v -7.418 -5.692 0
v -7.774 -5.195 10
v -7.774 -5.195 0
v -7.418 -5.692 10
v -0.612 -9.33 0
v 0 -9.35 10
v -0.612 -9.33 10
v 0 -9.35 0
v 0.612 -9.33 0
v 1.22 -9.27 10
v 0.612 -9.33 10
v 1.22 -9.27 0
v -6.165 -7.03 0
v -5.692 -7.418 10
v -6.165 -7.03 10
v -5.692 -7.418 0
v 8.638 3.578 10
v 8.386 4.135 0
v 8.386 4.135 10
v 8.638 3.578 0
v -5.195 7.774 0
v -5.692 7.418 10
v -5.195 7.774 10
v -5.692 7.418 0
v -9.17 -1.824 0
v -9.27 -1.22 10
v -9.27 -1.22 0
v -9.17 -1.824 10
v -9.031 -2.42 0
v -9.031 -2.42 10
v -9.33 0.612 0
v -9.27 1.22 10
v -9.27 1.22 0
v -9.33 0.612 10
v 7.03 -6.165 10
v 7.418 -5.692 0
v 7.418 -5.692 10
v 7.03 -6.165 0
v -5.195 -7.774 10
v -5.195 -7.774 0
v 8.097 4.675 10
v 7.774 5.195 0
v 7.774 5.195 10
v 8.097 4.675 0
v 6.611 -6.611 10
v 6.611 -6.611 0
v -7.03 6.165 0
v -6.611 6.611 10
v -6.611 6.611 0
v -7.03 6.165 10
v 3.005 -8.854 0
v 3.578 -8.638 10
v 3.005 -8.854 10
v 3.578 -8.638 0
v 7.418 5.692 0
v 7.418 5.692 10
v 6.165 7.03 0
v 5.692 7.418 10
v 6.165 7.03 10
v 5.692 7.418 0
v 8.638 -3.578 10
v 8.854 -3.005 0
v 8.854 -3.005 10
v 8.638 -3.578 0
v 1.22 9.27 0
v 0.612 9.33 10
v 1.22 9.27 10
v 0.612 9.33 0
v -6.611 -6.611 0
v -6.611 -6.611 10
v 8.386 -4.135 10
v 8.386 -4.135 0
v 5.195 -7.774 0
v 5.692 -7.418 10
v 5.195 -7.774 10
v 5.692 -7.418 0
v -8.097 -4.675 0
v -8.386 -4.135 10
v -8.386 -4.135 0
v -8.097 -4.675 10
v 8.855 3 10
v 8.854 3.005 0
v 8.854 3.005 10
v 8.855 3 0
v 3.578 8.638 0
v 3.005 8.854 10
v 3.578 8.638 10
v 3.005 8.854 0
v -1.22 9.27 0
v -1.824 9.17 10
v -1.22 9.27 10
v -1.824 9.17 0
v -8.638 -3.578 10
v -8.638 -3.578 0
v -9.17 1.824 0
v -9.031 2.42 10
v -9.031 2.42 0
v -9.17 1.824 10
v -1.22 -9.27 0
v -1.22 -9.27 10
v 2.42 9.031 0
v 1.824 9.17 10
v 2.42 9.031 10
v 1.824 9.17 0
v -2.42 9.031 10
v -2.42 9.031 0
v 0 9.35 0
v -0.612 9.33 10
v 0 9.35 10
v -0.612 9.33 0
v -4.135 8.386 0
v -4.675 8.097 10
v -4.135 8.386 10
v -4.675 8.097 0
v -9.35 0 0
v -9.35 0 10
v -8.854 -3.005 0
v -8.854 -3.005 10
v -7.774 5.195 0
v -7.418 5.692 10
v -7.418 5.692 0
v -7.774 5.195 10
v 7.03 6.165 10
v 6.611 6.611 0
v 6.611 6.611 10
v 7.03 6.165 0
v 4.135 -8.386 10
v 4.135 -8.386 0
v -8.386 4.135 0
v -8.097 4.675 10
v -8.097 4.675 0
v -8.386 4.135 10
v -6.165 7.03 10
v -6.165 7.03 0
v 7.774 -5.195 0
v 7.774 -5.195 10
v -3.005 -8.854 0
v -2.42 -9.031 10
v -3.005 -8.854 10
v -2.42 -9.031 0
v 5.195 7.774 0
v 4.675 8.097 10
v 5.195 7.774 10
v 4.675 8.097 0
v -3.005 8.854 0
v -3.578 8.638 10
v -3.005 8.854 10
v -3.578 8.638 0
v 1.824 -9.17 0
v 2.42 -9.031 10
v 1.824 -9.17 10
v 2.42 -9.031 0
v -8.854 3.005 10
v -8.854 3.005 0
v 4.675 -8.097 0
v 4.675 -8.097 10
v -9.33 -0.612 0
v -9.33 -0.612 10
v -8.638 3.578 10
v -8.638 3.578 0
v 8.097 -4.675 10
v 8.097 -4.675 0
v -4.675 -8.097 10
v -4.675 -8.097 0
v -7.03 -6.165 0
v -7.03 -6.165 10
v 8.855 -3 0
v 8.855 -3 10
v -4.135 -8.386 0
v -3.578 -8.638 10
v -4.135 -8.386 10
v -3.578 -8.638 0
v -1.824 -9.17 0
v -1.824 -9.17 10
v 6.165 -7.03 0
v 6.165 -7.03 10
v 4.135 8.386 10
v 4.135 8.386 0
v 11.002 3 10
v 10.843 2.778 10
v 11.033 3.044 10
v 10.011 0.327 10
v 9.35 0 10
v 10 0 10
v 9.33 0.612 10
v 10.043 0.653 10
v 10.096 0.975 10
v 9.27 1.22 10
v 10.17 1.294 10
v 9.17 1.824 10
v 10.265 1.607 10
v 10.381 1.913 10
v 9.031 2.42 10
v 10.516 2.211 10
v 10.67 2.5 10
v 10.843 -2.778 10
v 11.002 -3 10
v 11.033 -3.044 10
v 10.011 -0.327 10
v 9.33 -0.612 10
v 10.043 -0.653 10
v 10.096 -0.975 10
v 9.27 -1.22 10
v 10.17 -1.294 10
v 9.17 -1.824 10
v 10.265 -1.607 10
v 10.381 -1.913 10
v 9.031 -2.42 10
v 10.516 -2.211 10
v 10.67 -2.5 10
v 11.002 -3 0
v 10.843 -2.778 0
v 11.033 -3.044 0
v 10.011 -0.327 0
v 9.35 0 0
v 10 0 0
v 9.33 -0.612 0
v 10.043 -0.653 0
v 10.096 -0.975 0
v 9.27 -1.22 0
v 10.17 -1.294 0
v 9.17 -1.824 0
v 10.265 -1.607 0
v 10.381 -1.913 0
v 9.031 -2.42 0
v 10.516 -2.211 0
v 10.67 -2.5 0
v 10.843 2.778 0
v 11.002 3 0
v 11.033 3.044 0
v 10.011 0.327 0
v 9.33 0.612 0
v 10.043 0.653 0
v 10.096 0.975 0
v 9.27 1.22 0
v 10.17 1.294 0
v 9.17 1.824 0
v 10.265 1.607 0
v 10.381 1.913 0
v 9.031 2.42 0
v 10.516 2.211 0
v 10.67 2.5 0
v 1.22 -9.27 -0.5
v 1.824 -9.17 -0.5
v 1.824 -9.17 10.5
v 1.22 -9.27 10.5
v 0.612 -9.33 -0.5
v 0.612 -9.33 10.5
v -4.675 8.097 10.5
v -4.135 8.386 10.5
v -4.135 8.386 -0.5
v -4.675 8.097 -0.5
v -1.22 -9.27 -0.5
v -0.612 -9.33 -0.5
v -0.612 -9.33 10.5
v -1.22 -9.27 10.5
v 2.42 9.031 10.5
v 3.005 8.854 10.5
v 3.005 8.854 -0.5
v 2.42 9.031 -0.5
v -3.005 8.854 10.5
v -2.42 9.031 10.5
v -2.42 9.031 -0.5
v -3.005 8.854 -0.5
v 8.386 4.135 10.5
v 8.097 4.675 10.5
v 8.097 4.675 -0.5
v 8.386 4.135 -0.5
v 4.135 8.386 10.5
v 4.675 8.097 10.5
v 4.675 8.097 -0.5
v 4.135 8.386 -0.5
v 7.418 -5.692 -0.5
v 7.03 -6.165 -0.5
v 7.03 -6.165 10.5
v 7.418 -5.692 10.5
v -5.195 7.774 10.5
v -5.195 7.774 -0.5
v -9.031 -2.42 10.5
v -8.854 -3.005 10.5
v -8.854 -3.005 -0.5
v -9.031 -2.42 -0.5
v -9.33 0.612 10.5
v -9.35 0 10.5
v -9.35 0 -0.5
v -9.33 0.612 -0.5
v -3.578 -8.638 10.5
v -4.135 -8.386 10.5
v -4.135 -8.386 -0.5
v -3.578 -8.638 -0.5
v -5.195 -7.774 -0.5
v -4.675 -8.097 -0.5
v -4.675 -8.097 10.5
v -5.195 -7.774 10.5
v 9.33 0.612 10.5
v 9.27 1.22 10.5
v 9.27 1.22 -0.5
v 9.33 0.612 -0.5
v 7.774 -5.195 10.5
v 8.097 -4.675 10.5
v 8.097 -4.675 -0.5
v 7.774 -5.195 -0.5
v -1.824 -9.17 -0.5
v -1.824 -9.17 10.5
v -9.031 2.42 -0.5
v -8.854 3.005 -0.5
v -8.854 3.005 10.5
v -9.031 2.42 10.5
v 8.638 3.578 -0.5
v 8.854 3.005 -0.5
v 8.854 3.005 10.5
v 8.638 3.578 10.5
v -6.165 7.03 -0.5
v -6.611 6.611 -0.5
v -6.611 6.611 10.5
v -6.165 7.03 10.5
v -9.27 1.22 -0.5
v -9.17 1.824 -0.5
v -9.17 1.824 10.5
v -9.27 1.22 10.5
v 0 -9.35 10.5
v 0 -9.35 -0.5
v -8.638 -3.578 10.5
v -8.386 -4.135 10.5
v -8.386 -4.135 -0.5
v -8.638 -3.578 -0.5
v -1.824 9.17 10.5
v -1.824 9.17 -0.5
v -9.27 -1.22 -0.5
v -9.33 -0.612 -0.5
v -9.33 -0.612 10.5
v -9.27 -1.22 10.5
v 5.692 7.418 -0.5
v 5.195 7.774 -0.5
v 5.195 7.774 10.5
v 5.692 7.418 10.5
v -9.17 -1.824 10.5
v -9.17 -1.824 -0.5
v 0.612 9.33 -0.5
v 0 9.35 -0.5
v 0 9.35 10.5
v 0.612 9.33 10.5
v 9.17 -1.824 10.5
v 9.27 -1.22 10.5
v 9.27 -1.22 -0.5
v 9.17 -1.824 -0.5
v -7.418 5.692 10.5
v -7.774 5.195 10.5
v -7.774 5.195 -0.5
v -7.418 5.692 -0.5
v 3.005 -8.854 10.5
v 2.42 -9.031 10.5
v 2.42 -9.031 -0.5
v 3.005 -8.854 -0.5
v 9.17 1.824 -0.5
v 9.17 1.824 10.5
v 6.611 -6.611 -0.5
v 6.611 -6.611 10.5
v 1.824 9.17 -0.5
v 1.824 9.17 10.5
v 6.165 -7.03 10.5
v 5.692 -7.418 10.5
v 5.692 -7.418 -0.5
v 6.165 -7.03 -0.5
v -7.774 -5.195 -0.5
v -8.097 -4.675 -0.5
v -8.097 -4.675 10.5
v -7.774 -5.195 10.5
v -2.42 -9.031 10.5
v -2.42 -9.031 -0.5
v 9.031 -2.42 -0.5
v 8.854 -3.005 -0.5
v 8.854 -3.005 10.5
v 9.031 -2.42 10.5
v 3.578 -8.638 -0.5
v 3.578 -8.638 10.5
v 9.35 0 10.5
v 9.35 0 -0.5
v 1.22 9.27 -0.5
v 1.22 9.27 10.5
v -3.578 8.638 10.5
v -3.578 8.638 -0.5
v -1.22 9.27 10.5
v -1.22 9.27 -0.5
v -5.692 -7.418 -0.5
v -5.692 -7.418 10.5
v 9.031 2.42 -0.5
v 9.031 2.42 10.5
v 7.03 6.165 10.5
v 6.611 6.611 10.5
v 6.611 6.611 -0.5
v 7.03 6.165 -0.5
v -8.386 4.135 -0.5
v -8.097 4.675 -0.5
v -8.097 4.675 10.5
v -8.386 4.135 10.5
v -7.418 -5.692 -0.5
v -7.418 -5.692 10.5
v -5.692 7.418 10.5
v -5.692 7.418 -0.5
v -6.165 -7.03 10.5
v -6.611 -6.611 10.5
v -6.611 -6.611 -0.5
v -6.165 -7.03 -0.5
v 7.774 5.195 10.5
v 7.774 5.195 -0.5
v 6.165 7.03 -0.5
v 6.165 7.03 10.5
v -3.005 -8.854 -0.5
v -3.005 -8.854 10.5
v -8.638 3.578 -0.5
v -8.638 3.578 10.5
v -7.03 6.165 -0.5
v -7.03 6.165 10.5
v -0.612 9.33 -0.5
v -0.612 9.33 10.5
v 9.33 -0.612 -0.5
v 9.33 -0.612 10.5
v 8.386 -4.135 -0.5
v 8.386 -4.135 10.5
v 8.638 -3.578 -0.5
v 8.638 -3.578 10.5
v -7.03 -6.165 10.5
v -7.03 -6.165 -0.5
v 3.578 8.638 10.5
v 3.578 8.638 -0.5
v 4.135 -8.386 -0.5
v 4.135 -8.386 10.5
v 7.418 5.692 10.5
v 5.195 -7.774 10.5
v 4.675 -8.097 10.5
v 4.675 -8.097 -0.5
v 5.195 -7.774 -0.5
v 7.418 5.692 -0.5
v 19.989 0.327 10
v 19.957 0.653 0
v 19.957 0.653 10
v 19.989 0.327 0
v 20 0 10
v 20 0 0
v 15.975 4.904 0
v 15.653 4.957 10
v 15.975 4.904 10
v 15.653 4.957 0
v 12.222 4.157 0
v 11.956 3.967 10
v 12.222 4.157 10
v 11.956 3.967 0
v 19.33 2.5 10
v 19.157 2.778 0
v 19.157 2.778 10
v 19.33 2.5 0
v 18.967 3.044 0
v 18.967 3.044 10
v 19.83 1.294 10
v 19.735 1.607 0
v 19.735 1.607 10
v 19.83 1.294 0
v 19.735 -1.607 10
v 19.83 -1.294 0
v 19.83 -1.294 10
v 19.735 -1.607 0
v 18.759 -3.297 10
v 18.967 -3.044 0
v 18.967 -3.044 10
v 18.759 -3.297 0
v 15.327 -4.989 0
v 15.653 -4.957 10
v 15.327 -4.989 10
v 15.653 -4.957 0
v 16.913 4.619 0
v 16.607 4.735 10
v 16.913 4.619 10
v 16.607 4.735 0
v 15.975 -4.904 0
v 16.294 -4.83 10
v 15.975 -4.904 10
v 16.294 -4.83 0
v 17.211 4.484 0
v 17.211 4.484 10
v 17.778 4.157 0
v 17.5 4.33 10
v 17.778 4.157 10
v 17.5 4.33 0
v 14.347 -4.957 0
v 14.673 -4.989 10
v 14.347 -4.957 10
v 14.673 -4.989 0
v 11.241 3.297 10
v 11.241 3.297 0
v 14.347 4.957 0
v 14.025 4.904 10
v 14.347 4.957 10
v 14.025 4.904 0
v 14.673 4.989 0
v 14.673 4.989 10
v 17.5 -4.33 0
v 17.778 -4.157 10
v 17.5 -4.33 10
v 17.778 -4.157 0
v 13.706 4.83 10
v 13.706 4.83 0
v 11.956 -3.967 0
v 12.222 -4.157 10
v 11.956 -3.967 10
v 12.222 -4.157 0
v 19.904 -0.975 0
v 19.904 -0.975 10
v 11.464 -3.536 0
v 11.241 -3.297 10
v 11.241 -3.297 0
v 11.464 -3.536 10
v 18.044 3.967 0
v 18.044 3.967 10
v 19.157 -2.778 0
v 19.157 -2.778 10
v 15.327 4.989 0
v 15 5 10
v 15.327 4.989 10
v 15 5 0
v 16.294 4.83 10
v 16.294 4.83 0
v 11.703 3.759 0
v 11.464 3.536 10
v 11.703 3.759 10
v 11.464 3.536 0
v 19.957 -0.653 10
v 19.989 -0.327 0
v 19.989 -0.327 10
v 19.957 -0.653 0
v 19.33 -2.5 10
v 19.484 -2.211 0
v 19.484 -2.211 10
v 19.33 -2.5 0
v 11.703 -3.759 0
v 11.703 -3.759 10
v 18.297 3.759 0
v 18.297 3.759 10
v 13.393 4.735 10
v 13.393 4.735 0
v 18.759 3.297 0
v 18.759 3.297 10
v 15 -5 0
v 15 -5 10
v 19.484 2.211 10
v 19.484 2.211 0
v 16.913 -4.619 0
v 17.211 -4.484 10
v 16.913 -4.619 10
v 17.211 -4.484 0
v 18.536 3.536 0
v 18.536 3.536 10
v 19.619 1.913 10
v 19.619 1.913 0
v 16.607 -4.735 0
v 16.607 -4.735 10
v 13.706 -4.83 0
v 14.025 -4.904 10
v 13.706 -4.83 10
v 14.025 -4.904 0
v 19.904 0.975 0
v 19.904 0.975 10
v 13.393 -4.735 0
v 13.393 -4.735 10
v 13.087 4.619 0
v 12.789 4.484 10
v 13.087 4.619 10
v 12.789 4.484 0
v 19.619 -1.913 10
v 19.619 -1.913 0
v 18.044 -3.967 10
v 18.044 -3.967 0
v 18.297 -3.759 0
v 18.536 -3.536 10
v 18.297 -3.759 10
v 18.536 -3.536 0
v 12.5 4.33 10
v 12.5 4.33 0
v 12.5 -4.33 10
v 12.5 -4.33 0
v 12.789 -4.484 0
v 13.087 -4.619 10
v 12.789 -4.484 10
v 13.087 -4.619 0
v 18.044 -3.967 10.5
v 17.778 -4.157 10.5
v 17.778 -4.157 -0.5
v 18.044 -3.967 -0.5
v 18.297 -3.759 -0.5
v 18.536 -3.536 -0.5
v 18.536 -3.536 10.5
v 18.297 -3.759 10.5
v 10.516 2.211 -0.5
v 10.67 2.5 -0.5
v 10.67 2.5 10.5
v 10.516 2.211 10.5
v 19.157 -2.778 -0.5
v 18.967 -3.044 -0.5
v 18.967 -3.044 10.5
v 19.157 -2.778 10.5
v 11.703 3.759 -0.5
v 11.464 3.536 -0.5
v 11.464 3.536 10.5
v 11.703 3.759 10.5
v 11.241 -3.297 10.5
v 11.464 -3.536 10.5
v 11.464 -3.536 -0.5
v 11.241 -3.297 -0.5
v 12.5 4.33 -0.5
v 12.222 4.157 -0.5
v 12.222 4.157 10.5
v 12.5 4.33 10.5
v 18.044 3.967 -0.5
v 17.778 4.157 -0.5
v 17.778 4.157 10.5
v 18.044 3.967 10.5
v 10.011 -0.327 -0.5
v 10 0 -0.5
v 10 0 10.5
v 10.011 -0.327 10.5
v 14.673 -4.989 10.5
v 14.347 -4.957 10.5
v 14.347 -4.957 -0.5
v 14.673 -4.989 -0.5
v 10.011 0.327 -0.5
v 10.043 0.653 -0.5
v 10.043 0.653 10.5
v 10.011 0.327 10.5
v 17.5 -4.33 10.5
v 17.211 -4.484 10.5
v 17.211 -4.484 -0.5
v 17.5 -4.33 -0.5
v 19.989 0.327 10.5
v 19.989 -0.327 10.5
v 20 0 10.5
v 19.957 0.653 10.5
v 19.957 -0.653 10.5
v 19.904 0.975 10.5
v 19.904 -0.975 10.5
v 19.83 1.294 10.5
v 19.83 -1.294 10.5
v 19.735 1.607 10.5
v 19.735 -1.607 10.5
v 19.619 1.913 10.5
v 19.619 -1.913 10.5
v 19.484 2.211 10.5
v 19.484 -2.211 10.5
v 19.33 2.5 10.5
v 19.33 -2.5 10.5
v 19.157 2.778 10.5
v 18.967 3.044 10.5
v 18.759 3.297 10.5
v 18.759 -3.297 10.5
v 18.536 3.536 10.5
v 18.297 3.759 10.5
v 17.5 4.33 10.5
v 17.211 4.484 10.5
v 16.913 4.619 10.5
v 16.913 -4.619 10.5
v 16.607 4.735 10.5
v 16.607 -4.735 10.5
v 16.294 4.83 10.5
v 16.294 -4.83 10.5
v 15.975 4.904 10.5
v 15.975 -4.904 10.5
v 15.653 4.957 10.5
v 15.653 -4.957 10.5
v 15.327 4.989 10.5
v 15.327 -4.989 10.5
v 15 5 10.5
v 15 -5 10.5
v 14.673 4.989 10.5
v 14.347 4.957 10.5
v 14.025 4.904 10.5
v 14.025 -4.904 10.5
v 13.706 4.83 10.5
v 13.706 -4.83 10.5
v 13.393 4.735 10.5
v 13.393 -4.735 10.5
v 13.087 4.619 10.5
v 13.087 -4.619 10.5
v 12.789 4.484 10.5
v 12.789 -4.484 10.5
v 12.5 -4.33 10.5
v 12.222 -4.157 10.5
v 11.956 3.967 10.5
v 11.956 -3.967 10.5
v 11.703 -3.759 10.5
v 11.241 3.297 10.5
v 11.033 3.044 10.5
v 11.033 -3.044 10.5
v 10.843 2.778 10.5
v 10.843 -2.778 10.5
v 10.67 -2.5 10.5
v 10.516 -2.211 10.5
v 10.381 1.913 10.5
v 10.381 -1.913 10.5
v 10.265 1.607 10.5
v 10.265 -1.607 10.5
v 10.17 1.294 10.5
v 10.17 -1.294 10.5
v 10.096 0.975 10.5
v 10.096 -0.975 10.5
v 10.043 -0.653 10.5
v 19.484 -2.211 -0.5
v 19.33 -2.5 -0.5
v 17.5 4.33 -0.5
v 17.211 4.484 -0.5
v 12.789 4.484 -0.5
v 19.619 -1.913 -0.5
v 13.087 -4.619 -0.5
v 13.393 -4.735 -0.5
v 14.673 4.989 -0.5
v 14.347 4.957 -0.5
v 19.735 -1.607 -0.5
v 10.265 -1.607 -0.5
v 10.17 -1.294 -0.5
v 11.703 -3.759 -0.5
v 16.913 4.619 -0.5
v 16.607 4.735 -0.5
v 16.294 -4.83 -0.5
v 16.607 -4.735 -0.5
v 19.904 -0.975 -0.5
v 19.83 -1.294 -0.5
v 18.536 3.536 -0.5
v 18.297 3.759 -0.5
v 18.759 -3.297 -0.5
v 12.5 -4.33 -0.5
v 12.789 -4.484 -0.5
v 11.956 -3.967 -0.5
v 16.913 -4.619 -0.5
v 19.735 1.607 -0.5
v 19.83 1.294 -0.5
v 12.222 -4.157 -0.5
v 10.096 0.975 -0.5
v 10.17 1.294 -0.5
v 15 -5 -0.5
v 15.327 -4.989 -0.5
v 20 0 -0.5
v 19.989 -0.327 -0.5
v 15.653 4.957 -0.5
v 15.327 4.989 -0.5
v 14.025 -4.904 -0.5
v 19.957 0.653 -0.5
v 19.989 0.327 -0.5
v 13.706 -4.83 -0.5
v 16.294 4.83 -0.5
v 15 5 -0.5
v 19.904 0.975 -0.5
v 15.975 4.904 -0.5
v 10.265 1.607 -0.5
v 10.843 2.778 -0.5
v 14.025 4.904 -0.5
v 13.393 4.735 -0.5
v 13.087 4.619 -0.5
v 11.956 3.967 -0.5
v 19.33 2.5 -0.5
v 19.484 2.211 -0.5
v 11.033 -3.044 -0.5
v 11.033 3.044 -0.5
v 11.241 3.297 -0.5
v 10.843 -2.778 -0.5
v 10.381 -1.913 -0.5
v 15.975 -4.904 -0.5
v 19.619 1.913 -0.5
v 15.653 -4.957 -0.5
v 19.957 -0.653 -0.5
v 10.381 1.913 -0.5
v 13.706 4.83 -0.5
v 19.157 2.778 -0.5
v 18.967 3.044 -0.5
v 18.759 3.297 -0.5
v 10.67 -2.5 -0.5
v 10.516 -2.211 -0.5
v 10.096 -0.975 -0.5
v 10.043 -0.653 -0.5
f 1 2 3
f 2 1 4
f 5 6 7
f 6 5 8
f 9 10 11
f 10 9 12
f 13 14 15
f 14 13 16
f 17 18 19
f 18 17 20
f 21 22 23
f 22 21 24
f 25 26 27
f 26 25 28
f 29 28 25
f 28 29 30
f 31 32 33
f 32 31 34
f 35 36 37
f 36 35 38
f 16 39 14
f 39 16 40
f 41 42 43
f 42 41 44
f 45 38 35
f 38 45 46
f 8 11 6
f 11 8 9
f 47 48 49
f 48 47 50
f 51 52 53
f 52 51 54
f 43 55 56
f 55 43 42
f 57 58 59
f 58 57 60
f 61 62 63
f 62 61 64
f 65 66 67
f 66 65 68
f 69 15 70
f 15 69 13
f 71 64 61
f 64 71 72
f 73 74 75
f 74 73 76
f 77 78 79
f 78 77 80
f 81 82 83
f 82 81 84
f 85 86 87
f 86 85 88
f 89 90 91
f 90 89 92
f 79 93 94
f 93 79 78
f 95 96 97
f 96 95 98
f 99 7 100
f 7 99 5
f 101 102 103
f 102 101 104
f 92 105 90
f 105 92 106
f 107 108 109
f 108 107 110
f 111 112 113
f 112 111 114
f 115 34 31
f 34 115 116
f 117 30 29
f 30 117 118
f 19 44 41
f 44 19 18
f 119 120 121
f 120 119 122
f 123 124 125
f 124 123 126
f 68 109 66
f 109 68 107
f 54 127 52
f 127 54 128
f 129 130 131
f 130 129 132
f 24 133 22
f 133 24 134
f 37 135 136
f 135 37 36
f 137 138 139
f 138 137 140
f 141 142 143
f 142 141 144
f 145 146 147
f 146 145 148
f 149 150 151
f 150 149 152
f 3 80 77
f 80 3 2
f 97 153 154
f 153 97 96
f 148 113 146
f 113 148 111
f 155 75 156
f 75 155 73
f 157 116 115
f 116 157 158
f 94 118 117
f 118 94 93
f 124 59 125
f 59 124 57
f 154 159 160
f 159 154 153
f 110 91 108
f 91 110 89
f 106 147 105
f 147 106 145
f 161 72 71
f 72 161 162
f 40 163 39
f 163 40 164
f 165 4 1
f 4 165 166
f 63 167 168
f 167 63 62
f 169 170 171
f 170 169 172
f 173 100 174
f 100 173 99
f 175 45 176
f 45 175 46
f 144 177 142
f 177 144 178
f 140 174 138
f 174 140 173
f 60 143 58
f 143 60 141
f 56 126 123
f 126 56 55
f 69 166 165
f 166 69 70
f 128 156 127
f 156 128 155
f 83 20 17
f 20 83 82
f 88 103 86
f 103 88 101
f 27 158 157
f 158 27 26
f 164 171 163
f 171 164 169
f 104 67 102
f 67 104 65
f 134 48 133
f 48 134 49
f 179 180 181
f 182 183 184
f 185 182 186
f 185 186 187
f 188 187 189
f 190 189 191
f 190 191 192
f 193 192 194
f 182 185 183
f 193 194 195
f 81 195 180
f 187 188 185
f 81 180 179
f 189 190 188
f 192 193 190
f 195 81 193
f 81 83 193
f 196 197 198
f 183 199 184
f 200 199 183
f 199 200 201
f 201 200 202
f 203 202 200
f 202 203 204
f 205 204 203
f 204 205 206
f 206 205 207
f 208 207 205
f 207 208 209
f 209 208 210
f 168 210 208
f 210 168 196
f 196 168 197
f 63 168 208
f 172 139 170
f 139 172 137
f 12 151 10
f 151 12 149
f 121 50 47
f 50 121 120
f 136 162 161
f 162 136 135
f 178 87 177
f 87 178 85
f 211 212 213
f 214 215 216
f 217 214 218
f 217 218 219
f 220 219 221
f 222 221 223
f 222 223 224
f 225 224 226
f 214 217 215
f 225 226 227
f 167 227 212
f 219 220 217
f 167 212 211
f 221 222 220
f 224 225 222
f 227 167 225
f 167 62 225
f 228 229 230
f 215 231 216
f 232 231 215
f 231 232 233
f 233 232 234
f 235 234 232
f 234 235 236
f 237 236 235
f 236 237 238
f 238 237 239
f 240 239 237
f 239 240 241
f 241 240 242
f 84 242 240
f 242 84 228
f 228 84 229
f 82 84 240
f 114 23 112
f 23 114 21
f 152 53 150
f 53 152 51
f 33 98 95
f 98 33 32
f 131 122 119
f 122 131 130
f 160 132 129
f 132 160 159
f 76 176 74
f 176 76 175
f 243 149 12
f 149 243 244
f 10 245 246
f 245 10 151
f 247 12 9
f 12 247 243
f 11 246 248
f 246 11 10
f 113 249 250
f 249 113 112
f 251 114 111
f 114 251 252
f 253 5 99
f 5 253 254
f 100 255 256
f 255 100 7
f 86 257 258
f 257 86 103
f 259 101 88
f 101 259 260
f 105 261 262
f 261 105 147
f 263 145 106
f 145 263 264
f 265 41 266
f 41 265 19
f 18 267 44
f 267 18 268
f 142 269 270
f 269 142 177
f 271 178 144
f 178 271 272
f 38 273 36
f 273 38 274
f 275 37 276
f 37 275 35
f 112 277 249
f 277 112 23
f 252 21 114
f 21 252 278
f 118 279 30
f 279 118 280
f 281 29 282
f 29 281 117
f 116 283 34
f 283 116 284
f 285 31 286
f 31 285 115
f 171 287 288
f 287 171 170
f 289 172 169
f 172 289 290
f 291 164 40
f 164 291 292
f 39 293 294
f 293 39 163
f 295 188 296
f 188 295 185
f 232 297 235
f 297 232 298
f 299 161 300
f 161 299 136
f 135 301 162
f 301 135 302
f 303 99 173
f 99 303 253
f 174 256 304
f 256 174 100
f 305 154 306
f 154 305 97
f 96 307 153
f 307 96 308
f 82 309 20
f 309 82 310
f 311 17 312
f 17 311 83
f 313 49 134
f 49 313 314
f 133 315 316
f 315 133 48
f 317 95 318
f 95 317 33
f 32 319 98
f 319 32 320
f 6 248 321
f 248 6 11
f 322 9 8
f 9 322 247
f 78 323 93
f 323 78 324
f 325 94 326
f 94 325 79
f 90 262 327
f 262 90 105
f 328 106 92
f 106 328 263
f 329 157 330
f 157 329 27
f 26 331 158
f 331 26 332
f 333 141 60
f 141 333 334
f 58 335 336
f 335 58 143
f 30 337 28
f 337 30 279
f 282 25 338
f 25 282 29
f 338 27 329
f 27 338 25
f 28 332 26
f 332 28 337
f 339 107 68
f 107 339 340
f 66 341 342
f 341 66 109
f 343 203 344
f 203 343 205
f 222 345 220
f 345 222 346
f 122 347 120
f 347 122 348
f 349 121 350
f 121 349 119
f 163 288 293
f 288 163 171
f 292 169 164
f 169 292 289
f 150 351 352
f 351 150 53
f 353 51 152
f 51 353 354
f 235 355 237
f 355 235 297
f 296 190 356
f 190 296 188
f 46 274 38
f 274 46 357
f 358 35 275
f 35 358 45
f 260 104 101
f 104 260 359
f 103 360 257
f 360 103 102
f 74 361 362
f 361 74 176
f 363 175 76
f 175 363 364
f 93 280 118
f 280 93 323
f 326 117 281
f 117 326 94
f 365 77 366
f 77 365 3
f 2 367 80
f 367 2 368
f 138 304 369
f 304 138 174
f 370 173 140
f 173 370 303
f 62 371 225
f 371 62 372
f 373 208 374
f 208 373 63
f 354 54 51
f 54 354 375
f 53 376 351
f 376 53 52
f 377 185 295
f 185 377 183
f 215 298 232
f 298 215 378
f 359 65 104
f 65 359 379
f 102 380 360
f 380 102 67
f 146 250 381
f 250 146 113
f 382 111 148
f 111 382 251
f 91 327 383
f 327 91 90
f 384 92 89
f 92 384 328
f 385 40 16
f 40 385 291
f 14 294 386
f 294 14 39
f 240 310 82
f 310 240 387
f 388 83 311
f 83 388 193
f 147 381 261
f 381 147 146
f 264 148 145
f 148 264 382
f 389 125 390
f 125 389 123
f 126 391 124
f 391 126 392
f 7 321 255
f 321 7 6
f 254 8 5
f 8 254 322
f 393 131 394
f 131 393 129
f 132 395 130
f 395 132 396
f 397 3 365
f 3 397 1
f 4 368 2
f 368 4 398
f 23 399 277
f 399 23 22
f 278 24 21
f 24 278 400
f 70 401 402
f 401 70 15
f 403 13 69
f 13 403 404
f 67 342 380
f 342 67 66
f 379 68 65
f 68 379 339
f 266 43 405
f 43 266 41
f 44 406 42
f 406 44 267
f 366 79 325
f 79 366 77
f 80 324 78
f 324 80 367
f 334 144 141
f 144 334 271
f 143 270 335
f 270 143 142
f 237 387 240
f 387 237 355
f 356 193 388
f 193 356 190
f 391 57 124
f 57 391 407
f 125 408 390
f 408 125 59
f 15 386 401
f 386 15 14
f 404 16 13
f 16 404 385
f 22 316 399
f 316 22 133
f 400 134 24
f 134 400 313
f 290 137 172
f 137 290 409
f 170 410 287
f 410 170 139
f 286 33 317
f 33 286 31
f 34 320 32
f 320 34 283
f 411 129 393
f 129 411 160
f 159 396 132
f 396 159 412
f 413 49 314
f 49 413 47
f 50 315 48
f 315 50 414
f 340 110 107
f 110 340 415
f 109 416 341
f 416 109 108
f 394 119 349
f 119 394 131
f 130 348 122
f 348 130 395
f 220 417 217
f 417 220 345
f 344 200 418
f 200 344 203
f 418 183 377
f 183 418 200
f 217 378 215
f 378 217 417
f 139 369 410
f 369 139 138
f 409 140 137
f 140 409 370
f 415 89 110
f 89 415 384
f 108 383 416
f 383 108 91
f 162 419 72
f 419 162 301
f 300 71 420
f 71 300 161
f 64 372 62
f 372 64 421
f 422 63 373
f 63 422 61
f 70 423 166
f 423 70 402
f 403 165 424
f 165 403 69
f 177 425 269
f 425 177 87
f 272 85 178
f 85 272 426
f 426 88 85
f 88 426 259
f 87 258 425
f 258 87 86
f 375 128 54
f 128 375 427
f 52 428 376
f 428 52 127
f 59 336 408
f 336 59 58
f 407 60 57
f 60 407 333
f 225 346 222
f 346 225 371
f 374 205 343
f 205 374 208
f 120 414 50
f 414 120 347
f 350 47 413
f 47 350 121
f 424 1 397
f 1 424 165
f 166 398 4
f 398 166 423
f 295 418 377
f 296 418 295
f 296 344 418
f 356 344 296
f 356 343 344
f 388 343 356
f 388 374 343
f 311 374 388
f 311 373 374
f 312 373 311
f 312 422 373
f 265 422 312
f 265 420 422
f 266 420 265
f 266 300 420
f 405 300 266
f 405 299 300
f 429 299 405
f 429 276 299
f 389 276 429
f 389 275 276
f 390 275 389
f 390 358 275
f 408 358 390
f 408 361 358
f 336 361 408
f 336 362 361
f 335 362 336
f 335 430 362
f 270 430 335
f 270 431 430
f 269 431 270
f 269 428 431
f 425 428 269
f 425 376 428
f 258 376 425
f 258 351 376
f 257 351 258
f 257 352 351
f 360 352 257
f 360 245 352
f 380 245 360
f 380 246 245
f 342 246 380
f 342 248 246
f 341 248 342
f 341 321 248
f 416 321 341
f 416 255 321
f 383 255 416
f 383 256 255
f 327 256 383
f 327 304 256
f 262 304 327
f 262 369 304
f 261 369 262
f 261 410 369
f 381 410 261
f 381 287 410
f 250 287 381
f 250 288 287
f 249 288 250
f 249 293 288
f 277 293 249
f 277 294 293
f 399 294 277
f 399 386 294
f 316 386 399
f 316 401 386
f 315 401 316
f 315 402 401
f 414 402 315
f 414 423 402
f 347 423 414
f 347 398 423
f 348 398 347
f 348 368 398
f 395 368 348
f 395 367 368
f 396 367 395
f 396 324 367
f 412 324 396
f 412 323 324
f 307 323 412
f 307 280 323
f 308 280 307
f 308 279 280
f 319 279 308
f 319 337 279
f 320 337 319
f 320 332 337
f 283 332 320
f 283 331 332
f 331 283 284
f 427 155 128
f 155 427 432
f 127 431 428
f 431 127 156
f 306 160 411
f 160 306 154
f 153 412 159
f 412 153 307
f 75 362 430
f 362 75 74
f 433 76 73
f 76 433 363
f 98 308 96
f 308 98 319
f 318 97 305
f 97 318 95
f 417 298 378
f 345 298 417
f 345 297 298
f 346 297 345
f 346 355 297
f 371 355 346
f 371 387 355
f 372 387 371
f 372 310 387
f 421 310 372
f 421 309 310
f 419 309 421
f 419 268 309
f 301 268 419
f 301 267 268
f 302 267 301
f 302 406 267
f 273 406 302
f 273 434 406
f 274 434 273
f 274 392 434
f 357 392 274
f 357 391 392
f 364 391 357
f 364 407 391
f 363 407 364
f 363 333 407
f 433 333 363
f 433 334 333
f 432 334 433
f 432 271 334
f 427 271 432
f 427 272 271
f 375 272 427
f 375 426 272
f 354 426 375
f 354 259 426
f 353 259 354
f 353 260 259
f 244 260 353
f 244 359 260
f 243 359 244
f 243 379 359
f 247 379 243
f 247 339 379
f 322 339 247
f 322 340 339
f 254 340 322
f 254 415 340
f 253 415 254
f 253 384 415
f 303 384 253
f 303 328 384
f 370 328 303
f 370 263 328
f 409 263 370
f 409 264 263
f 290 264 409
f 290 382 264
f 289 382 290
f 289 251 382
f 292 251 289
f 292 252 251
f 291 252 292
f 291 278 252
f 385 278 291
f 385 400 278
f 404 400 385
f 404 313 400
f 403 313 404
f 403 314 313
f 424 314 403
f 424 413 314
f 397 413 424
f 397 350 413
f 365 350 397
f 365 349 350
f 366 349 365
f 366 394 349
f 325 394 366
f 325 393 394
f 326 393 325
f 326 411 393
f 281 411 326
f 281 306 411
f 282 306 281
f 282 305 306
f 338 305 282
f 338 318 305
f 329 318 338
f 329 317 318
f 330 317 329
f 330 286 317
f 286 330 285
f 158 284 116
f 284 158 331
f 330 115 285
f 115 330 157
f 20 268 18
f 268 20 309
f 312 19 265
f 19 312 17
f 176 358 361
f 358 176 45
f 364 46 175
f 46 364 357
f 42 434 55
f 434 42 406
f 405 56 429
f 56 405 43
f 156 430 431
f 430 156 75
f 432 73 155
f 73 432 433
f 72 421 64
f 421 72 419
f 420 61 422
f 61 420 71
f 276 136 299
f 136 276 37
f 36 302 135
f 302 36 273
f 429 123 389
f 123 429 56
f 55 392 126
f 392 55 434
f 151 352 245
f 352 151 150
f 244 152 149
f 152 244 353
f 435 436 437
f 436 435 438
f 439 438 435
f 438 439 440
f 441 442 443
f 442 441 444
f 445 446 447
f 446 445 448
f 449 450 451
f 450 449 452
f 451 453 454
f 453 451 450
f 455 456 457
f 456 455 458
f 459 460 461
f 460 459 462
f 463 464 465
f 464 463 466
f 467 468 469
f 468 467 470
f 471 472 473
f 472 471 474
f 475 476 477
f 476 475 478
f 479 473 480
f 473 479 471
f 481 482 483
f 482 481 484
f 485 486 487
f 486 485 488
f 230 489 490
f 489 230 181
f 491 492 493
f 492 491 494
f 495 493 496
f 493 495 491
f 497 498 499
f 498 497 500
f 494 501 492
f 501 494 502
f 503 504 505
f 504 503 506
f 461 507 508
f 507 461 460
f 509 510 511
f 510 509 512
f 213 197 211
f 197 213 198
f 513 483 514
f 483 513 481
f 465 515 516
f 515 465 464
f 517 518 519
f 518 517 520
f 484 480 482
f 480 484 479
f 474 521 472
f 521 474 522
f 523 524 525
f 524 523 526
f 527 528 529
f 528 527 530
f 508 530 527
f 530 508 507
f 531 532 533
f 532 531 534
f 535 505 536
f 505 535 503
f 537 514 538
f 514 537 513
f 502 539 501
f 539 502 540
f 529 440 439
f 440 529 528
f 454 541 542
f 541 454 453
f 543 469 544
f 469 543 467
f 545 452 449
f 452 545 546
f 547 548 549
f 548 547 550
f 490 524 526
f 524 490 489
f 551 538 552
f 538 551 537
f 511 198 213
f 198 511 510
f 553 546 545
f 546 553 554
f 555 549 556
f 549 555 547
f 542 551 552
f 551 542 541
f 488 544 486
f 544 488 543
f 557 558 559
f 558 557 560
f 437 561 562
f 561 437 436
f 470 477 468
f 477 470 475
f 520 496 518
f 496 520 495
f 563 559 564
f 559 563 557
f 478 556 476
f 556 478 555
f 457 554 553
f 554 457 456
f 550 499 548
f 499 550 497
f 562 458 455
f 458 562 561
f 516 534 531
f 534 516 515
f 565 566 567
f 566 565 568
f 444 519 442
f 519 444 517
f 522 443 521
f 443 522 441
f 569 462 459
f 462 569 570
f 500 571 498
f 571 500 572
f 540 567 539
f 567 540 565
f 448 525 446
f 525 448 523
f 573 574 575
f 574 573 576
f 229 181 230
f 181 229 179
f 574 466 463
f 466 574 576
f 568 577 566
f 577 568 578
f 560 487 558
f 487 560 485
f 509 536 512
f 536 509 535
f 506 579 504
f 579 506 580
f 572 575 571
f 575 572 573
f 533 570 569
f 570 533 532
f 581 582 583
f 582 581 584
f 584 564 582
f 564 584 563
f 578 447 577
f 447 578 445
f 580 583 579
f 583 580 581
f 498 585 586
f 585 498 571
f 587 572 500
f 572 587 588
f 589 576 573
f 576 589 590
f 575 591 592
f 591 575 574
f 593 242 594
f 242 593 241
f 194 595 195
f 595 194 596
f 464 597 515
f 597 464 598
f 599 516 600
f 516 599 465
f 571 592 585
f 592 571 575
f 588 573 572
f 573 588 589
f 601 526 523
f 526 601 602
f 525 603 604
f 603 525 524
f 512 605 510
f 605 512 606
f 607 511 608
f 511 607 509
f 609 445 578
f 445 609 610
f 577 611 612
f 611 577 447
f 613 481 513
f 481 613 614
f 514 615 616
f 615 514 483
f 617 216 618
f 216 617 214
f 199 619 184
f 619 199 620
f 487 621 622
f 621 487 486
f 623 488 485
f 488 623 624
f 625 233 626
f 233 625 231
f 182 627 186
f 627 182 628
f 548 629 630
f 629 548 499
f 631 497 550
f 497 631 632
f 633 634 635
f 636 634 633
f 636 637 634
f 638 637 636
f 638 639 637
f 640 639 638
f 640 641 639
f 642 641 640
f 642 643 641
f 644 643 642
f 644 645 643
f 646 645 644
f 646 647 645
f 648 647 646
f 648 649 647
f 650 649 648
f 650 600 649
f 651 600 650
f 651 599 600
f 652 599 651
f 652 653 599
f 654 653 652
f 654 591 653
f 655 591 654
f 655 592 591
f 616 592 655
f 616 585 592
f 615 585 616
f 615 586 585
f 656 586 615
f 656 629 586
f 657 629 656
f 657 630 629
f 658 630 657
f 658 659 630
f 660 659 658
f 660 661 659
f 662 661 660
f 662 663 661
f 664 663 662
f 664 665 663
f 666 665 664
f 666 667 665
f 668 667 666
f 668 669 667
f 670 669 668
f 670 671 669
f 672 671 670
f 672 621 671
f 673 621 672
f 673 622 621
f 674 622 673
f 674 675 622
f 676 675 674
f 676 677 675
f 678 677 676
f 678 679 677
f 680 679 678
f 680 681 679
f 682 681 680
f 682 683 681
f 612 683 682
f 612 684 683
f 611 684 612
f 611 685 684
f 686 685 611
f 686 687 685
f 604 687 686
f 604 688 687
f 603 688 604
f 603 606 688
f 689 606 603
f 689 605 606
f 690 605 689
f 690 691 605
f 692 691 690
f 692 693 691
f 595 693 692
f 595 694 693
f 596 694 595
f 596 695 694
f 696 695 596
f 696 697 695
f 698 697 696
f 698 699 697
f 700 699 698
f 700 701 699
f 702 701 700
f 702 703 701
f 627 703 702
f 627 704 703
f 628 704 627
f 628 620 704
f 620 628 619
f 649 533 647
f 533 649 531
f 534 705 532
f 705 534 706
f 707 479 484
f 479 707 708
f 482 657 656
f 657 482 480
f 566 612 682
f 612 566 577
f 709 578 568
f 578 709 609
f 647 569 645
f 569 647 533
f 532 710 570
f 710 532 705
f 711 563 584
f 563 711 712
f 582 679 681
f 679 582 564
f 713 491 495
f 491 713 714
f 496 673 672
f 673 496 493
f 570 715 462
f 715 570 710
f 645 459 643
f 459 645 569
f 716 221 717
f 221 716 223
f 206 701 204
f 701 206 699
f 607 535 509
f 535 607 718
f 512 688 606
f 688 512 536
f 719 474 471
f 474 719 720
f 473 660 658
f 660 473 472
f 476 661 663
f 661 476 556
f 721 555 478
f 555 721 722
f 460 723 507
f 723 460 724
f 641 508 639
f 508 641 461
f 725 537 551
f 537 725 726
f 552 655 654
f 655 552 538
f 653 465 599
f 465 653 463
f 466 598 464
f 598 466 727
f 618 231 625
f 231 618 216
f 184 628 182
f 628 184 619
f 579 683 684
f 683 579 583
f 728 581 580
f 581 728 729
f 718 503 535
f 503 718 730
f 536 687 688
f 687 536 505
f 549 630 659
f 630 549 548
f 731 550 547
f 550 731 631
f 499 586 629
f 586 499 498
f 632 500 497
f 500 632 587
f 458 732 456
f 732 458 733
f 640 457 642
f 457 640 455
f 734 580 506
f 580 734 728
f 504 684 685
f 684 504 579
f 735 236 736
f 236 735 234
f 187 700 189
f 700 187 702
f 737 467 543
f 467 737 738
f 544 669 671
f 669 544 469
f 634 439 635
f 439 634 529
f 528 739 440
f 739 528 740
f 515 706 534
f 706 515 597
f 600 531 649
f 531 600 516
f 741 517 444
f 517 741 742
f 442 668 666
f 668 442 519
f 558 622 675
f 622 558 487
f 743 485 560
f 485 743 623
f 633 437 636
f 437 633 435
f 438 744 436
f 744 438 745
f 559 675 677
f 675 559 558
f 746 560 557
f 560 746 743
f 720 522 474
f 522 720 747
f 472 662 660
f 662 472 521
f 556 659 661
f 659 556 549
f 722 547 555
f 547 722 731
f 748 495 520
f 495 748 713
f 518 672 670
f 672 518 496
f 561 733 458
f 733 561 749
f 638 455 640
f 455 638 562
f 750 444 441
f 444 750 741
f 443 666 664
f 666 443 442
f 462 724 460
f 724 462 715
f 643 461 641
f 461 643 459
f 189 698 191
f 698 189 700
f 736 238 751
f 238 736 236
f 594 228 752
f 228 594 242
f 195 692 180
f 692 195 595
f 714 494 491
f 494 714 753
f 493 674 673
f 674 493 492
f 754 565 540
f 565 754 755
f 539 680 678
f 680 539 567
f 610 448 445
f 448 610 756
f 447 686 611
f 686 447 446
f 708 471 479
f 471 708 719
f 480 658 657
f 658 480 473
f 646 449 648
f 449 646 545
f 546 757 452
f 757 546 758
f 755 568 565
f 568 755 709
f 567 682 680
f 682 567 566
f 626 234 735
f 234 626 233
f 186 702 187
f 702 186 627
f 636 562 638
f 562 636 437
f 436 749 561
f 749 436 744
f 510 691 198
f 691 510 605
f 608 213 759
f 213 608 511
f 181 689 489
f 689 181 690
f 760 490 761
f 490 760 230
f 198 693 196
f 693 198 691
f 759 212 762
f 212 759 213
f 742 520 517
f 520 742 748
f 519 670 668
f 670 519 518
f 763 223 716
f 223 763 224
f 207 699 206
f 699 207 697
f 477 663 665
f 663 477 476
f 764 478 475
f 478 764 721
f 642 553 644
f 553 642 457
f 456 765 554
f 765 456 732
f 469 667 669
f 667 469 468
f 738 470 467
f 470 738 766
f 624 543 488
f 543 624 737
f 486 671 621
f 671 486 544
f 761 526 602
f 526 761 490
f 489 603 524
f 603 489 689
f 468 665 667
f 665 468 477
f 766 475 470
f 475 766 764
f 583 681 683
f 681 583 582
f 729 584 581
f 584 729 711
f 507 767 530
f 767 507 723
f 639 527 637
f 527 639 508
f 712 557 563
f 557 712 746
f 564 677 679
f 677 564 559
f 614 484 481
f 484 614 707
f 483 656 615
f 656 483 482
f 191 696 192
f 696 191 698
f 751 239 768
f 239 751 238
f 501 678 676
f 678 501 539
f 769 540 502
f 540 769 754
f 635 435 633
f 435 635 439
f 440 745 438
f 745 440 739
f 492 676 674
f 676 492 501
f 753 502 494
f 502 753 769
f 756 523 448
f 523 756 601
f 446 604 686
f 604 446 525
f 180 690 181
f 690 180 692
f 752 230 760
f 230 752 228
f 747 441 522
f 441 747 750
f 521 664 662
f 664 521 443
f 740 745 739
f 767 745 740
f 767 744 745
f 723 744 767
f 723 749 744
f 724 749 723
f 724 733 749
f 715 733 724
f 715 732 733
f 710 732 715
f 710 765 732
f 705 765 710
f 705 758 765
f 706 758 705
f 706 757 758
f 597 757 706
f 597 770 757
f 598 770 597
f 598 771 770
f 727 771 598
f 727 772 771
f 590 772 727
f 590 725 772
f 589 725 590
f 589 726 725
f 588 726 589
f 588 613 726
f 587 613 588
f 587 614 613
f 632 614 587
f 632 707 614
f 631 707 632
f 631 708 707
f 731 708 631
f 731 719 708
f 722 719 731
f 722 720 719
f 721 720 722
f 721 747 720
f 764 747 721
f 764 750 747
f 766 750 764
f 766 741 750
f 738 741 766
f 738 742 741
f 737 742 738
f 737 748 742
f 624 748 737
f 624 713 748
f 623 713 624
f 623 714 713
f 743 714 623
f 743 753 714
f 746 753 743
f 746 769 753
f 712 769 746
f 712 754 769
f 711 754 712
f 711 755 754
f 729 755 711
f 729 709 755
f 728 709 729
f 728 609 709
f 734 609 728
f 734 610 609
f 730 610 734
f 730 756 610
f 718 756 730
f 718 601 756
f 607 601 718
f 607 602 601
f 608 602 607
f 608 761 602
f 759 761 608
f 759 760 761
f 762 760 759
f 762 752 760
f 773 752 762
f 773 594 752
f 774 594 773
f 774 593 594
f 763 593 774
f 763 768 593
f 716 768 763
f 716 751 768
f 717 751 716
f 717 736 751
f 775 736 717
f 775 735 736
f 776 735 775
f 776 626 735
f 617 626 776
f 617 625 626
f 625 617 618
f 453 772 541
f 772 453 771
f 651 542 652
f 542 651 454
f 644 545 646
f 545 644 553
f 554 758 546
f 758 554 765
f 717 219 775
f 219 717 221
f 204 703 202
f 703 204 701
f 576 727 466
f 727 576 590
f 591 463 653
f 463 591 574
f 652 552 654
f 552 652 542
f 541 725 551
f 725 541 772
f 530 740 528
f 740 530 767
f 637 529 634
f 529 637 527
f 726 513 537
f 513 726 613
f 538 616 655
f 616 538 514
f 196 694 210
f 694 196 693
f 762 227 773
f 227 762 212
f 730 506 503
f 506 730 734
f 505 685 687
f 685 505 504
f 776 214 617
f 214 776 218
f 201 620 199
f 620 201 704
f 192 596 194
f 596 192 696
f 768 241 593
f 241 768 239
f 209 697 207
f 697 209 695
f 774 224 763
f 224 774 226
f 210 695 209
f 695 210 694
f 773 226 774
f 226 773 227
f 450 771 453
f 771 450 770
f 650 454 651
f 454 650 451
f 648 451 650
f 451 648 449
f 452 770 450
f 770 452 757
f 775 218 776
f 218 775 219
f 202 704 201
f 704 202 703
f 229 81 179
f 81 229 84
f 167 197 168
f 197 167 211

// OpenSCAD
// Snap-on tubing clip for a 12.7 mm (1/2 inch) lab stand rod
// Printed flat: extrusion of 10 mm (Z) of a 2-D profile in XY
// Units: mm

$fn = 96;

// ---- Rod ring ----
rod_id     = 12.7;   // rod inner diameter
rod_wall   = 3;      // rod ring wall thickness
rod_od     = rod_id + 2 * rod_wall;  // 18.7 mm outer diameter
rod_h      = 10;     // extrusion height (Z)
rod_open   = 10;     // opening width cut from -X side
rod_ylim   = rod_open / 2;            // -5 < y < 5 for opening

// ---- Tubing ring ----
tube_id    = 6;      // tubing inner diameter
tube_wall  = 2;      // tubing ring wall thickness
tube_od    = tube_id + 2 * tube_wall; // 10 mm outer diameter
tube_x     = 15;     // ring centre X
tube_h     = rod_h;  // same extrusion height
tube_open  = 4.5;    // opening width cut from +X side
tube_ylim  = tube_open / 2;           // -2.25 < y < 2.25

// ---- Bridge ----
bridge_w   = 6;      // bridge width in Y
bridge_x0  = 8;      // bridge start X
bridge_x1  = 12;     // bridge end X

// ---- Cutting overlap ----
eps        = 0.5;    // extension past cut faces

difference() {
    union() {
        // Rod ring
        cylinder(d = rod_od, h = rod_h);
        translate([0, 0, -eps])
            linear_extrude(height = rod_h + 2 * eps)
                difference() {
                    circle(d = rod_od);
                    translate([-rod_open / 2, -rod_ylim, 0])
                        cube([rod_open, rod_open, rod_h]);
                }

        // Tubing ring
        translate([tube_x, 0, 0])
            cylinder(d = tube_od, h = tube_h);
        translate([tube_x, 0, -eps])
            linear_extrude(height = tube_h + 2 * eps)
                difference() {
                    circle(d = tube_od);
                    translate([tube_open / 2, -tube_ylim, 0])
                        cube([tube_open, tube_open, tube_h]);
                }

        // Solid bridge between rings
        translate([bridge_x0, -bridge_w / 2, 0])
            cube([bridge_x1 - bridge_x0, bridge_w, rod_h]);
    }
}
